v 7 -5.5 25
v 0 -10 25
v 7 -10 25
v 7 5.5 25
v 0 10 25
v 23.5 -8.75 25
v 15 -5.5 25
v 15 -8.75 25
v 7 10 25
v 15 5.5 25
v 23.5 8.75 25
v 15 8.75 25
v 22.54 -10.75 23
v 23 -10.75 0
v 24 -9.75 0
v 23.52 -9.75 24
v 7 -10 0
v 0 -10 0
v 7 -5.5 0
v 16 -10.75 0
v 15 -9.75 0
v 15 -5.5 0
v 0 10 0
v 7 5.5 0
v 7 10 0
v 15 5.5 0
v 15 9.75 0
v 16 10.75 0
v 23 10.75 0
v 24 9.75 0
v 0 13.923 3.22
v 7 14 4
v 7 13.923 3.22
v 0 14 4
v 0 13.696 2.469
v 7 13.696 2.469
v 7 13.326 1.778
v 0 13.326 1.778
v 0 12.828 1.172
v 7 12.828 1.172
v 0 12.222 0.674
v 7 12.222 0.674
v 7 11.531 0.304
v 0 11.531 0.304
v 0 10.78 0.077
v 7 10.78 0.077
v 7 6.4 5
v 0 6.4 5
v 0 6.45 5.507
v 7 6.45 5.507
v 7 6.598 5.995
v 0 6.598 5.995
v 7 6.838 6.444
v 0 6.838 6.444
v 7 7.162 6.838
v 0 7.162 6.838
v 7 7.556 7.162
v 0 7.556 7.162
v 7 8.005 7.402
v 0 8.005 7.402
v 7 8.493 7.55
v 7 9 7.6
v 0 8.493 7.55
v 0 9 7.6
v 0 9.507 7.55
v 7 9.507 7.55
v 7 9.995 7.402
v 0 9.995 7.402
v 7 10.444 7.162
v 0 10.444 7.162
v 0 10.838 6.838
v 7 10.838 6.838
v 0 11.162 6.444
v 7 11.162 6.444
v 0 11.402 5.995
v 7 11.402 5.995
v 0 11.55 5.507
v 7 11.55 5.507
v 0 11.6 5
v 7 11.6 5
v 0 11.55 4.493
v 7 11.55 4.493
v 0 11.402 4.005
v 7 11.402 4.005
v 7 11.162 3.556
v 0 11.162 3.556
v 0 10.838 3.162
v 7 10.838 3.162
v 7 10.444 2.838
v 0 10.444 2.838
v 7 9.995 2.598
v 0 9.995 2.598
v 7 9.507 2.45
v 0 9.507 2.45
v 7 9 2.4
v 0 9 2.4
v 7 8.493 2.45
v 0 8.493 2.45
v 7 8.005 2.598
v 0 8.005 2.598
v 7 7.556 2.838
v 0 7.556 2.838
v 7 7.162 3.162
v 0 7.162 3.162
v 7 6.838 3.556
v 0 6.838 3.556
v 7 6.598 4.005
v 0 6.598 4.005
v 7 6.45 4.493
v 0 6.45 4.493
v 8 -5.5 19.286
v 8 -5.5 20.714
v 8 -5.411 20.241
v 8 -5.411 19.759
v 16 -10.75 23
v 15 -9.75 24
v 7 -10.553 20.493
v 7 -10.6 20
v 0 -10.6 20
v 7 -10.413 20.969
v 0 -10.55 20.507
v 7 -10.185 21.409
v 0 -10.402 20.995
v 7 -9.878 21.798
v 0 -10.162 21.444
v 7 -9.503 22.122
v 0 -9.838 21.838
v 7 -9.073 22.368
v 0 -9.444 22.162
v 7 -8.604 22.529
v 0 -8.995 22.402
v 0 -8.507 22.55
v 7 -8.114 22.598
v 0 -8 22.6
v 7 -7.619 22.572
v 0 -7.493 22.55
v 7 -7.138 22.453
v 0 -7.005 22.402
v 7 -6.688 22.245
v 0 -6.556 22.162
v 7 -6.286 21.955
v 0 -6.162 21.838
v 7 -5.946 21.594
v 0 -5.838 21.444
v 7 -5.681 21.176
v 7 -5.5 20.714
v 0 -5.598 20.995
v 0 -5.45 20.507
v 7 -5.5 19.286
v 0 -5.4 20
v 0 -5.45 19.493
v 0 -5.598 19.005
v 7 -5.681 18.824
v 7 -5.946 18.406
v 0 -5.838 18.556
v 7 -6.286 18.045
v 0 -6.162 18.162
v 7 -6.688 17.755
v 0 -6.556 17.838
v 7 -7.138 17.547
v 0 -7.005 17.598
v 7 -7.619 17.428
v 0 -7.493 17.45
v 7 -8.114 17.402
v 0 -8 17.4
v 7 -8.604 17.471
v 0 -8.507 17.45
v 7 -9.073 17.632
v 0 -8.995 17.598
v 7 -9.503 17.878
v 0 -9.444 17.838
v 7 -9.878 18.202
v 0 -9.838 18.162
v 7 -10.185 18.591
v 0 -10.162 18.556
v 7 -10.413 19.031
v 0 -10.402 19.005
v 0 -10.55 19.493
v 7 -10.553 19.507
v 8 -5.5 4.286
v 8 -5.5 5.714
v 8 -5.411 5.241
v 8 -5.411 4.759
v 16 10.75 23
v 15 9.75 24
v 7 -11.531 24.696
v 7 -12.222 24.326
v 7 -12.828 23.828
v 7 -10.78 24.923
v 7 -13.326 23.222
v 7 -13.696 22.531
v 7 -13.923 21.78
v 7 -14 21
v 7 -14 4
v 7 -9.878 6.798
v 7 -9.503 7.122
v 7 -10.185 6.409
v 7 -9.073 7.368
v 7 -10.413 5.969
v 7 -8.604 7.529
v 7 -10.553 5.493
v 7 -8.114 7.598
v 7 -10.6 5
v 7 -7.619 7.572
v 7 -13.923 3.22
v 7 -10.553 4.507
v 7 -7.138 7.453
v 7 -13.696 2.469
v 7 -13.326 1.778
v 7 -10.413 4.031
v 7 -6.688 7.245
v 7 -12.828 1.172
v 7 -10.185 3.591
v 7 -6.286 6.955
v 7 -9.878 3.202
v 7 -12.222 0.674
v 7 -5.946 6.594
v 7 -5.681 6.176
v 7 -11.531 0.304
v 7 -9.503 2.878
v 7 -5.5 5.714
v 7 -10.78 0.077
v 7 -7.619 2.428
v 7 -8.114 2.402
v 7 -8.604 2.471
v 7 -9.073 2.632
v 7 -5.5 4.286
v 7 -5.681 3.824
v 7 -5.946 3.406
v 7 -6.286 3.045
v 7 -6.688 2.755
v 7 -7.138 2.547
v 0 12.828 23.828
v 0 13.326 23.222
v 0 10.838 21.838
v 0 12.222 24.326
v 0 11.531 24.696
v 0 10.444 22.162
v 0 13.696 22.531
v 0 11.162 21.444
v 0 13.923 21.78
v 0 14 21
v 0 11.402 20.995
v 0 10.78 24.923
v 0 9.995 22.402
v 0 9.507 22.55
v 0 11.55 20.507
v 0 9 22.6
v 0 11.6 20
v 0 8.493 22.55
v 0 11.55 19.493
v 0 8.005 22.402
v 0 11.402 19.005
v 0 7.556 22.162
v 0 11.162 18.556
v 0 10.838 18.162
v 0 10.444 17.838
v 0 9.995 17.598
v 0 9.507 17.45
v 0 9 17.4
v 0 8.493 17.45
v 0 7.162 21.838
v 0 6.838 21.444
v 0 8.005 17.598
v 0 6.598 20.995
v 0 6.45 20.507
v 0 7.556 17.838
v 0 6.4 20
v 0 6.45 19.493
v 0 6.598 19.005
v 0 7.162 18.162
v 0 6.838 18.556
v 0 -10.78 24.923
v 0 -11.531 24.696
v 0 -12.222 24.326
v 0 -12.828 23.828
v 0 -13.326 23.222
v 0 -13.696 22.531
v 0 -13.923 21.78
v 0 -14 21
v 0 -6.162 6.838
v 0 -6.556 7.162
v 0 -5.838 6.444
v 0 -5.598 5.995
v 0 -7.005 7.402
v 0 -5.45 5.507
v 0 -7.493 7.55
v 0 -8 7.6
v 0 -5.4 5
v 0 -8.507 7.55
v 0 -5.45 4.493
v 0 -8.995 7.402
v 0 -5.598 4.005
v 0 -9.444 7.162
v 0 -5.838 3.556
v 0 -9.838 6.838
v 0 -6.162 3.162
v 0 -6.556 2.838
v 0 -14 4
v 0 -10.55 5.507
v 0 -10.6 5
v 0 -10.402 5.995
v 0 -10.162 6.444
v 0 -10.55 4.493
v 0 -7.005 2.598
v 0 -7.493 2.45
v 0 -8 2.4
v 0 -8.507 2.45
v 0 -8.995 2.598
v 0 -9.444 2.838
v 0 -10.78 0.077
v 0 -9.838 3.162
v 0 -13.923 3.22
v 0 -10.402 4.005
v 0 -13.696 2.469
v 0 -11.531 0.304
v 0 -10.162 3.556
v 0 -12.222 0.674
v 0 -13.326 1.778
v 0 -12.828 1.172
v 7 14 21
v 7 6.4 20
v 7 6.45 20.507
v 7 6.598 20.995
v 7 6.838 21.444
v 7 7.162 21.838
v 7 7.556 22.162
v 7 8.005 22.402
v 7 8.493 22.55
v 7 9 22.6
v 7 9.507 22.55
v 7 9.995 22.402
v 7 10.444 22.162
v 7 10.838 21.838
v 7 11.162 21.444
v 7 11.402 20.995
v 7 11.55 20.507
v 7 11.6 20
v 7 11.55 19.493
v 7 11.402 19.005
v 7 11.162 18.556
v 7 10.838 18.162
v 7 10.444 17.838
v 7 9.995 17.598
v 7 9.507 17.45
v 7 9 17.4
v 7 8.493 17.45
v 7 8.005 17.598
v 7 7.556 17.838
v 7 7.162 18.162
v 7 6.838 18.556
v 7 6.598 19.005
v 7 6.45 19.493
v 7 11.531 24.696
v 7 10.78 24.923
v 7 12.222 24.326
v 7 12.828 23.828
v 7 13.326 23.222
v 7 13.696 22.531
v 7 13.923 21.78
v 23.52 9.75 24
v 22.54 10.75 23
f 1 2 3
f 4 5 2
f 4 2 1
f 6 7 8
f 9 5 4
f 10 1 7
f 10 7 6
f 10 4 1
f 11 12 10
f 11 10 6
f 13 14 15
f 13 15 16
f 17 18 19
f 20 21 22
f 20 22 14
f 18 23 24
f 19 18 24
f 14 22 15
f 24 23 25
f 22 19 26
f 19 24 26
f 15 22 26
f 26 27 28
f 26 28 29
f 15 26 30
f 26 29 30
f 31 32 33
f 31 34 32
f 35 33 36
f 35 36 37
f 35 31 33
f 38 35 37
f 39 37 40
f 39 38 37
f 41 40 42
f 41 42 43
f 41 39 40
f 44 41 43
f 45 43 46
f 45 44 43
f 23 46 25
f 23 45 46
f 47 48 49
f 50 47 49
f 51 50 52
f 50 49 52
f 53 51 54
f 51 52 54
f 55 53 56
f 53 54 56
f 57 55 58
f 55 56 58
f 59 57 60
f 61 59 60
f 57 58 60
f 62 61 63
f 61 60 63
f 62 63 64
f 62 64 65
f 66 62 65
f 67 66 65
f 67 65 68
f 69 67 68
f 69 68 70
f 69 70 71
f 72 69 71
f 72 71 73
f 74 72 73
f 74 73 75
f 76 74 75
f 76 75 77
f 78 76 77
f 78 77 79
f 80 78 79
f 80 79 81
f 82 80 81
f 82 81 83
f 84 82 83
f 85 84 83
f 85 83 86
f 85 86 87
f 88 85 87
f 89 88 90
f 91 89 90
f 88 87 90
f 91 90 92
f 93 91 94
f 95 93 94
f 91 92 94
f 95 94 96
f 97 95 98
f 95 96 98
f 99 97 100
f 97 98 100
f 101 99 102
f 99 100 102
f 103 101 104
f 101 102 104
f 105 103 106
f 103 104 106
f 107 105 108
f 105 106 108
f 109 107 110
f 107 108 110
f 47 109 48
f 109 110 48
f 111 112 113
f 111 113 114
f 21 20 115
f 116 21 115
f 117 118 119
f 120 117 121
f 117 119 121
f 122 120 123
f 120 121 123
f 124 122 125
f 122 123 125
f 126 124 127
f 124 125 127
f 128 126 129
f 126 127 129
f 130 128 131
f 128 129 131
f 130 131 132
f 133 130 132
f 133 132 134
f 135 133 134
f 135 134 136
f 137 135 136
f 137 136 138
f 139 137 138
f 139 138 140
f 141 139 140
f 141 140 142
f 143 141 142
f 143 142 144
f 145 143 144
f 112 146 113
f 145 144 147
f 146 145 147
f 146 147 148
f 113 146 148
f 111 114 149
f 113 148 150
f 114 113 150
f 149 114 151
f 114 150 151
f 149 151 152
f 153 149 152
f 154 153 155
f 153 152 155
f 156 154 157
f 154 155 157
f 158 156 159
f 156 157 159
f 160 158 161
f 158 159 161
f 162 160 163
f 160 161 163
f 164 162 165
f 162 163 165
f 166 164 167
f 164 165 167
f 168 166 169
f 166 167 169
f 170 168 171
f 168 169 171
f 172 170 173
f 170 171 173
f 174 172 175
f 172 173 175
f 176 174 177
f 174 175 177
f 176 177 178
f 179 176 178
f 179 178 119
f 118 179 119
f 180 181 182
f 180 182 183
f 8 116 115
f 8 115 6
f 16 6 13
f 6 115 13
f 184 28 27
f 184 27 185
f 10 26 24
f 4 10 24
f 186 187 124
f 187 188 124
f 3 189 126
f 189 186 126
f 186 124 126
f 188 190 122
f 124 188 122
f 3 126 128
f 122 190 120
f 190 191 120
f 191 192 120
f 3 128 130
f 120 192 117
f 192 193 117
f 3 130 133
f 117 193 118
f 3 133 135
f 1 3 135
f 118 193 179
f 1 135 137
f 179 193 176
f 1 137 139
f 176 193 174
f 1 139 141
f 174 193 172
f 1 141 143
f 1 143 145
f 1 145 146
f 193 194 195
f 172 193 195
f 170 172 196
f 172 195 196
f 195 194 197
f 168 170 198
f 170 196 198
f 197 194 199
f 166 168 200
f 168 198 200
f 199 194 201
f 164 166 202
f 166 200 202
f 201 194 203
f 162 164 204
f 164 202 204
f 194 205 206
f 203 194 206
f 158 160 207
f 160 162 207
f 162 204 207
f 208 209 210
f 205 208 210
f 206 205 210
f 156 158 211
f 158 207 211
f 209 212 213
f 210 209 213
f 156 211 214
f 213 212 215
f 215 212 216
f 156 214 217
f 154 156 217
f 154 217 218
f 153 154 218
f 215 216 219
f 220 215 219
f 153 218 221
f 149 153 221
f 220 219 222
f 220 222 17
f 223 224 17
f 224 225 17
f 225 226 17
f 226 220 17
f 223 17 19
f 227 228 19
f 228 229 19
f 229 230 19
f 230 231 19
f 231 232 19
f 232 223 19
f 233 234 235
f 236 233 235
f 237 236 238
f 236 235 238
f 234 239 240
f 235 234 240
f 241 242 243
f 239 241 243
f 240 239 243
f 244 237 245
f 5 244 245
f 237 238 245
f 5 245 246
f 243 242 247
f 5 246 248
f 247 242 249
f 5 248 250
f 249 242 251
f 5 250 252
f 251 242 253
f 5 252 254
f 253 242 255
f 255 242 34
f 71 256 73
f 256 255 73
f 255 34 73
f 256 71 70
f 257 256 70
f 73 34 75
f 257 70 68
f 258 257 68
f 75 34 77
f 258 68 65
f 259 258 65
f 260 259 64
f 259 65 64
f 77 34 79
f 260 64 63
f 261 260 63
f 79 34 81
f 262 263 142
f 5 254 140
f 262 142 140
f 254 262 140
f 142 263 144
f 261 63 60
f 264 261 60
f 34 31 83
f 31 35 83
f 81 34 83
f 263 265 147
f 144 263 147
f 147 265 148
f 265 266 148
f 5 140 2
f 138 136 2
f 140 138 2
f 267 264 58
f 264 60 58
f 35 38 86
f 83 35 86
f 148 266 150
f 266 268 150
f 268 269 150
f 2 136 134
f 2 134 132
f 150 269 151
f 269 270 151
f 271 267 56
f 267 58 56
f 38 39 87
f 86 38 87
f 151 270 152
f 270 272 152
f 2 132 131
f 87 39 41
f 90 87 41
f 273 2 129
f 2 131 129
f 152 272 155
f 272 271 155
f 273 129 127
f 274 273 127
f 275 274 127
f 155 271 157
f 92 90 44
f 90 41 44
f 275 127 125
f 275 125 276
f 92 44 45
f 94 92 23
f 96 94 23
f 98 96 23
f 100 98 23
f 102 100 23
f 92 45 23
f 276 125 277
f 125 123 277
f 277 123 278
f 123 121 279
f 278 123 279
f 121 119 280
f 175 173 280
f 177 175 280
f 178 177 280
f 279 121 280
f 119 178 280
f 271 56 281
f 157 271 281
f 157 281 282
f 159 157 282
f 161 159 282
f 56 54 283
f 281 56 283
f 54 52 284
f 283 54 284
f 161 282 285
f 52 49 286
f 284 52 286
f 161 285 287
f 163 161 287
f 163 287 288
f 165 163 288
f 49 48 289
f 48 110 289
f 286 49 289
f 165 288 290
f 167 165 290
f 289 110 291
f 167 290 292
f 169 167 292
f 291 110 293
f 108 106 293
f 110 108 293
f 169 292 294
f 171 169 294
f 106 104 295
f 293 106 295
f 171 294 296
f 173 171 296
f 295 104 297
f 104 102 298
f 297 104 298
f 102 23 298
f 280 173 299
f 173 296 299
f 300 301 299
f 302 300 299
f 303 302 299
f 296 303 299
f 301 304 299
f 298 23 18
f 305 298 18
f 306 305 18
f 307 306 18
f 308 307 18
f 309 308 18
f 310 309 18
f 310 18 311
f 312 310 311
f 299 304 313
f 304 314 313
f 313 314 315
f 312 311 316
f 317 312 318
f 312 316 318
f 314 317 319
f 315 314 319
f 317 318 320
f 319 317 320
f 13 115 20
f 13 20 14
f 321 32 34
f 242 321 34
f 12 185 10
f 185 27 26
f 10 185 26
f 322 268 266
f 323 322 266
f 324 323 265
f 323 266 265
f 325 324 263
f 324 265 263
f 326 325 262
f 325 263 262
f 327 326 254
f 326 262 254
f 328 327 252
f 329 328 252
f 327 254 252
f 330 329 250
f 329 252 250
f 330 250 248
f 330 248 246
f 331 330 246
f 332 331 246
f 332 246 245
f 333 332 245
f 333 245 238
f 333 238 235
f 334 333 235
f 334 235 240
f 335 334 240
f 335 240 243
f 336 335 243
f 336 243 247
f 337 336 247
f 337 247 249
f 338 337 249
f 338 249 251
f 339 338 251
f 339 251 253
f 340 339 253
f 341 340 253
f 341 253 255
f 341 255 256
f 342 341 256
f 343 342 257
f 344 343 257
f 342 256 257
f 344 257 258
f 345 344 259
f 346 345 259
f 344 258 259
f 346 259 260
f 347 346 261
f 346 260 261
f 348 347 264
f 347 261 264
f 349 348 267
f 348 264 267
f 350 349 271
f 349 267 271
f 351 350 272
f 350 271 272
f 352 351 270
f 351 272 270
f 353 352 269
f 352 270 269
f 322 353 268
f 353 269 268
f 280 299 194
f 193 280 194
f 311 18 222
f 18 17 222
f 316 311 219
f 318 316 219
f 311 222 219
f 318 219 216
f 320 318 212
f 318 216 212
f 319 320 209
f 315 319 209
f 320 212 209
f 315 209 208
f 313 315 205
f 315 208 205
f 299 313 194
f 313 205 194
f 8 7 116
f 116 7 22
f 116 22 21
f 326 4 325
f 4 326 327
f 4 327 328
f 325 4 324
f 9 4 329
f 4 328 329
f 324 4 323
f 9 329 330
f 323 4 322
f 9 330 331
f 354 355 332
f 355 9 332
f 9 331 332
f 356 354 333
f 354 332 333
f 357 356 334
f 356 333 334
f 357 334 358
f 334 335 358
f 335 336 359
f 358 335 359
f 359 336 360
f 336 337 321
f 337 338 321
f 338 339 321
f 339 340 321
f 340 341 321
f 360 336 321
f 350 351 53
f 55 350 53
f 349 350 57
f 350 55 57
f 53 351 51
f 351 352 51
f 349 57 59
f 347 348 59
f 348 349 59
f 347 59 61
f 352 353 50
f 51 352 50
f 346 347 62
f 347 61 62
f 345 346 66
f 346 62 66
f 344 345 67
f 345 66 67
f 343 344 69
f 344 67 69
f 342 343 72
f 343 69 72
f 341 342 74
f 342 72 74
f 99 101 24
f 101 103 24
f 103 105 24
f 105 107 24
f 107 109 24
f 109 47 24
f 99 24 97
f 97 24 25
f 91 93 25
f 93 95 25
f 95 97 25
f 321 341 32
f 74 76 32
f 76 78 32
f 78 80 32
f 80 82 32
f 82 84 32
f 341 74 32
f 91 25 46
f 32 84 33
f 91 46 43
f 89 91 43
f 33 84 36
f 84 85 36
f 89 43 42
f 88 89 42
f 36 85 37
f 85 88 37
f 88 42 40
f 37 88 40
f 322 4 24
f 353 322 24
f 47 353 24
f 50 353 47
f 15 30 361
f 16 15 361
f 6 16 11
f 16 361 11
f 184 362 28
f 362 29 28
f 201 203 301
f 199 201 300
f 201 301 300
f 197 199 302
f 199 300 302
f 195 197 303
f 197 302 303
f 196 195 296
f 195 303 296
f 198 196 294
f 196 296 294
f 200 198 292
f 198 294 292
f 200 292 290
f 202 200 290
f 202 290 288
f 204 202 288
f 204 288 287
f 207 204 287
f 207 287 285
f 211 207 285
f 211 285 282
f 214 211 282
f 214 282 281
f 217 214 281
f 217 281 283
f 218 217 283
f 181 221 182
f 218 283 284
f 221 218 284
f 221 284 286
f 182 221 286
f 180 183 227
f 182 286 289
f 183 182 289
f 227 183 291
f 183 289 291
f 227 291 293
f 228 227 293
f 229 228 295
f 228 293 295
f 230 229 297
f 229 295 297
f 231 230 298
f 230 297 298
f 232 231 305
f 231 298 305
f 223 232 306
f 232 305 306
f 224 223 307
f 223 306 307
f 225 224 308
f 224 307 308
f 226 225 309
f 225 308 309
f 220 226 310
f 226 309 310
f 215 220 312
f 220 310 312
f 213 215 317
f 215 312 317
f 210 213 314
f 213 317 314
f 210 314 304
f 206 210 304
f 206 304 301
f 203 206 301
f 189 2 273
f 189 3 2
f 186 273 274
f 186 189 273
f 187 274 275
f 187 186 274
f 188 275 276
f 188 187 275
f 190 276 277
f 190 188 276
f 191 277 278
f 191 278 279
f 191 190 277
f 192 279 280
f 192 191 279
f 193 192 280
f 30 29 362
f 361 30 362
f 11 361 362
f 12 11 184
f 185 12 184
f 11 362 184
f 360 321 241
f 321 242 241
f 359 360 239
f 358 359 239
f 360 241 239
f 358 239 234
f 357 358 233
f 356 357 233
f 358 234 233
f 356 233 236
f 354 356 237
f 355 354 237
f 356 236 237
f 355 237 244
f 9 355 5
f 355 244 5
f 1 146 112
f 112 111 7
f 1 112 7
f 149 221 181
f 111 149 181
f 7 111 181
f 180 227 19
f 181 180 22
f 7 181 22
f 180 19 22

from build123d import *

# Parameters (mm, degrees)
BOSS_EXTRUDE1_DEPTH = 25
SKETCH2_R           = 2.6
CUT_EXTRUDE1_DEPTH  = 8
CUT_EXTRUDE2_DEPTH  = 25.75
FILLET1_R           = 4
CHAMFER1_SIZE       = 2
CHAMFER2_SIZE       = 1


with BuildPart() as part:
    # Sketch1 → Boss-Extrude1 (new body)
    with BuildSketch(Plane.XY):
        Polygon((0, 14), (0, -14), (7, -14), (7, -5.5), (15, -5.5), (15, -10.75), (24, -10.75), (24, 10.75), (15, 10.75), (15, 5.5), (7, 5.5), (7, 14), align=None)
    extrude(amount=BOSS_EXTRUDE1_DEPTH)

    # Sketch2 → Cut-Extrude1 (cut)
    with BuildSketch(Plane.ZY):
        with Locations(Location((5, 9, 0), (0, 0, 270))):  # turned: the seam where the file's is
            Circle(SKETCH2_R)
        with Locations(Location((20, 9, 0), (0, 0, 270))):  # turned: the seam where the file's is
            Circle(SKETCH2_R)
        with Locations(Location((5, -8, 0), (0, 0, 270))):  # turned: the seam where the file's is
            Circle(SKETCH2_R)
        with Locations(Location((20, -8, 0), (0, 0, 270))):  # turned: the seam where the file's is
            Circle(SKETCH2_R)
    extrude(amount=-CUT_EXTRUDE1_DEPTH, mode=Mode.SUBTRACT)

    # Sketch3 → Cut-Extrude2 (cut, through all)
    with BuildSketch(Plane(origin=(0, 10.75, 0), x_dir=(1, 0, 0), z_dir=(0, 1, 0))):
        Polygon((24, 0), (23.5, -25), (24, -25), align=None)
    extrude(amount=-CUT_EXTRUDE2_DEPTH, mode=Mode.SUBTRACT)

    # Fillet1
    fillet1_edges = [part.edges().sort_by_distance(p)[0] for p in [
        (3.5, -14, 25),
        (3.5, -14, 0),
        (3.5, 14, 0),
        (3.5, 14, 25),
    ]]
    fillet(fillet1_edges, radius=FILLET1_R)

    # Chamfer1
    chamfer1_edges = [part.edges().sort_by_distance(p)[0] for p in [
        (19.25, -10.75, 25),
        (19.25, 10.75, 25),
    ]]
    chamfer(chamfer1_edges, length=CHAMFER1_SIZE)

    # Chamfer2
    chamfer2_edges = [part.edges().sort_by_distance(p)[0] for p in [
        (15, -10.75, 11.5),
        (15, 10.75, 11.5),
        (23.77, -10.75, 11.5),
        (23.77, 10.75, 11.5),
    ]]
    chamfer(chamfer2_edges, length=CHAMFER2_SIZE)


solid = part.part
